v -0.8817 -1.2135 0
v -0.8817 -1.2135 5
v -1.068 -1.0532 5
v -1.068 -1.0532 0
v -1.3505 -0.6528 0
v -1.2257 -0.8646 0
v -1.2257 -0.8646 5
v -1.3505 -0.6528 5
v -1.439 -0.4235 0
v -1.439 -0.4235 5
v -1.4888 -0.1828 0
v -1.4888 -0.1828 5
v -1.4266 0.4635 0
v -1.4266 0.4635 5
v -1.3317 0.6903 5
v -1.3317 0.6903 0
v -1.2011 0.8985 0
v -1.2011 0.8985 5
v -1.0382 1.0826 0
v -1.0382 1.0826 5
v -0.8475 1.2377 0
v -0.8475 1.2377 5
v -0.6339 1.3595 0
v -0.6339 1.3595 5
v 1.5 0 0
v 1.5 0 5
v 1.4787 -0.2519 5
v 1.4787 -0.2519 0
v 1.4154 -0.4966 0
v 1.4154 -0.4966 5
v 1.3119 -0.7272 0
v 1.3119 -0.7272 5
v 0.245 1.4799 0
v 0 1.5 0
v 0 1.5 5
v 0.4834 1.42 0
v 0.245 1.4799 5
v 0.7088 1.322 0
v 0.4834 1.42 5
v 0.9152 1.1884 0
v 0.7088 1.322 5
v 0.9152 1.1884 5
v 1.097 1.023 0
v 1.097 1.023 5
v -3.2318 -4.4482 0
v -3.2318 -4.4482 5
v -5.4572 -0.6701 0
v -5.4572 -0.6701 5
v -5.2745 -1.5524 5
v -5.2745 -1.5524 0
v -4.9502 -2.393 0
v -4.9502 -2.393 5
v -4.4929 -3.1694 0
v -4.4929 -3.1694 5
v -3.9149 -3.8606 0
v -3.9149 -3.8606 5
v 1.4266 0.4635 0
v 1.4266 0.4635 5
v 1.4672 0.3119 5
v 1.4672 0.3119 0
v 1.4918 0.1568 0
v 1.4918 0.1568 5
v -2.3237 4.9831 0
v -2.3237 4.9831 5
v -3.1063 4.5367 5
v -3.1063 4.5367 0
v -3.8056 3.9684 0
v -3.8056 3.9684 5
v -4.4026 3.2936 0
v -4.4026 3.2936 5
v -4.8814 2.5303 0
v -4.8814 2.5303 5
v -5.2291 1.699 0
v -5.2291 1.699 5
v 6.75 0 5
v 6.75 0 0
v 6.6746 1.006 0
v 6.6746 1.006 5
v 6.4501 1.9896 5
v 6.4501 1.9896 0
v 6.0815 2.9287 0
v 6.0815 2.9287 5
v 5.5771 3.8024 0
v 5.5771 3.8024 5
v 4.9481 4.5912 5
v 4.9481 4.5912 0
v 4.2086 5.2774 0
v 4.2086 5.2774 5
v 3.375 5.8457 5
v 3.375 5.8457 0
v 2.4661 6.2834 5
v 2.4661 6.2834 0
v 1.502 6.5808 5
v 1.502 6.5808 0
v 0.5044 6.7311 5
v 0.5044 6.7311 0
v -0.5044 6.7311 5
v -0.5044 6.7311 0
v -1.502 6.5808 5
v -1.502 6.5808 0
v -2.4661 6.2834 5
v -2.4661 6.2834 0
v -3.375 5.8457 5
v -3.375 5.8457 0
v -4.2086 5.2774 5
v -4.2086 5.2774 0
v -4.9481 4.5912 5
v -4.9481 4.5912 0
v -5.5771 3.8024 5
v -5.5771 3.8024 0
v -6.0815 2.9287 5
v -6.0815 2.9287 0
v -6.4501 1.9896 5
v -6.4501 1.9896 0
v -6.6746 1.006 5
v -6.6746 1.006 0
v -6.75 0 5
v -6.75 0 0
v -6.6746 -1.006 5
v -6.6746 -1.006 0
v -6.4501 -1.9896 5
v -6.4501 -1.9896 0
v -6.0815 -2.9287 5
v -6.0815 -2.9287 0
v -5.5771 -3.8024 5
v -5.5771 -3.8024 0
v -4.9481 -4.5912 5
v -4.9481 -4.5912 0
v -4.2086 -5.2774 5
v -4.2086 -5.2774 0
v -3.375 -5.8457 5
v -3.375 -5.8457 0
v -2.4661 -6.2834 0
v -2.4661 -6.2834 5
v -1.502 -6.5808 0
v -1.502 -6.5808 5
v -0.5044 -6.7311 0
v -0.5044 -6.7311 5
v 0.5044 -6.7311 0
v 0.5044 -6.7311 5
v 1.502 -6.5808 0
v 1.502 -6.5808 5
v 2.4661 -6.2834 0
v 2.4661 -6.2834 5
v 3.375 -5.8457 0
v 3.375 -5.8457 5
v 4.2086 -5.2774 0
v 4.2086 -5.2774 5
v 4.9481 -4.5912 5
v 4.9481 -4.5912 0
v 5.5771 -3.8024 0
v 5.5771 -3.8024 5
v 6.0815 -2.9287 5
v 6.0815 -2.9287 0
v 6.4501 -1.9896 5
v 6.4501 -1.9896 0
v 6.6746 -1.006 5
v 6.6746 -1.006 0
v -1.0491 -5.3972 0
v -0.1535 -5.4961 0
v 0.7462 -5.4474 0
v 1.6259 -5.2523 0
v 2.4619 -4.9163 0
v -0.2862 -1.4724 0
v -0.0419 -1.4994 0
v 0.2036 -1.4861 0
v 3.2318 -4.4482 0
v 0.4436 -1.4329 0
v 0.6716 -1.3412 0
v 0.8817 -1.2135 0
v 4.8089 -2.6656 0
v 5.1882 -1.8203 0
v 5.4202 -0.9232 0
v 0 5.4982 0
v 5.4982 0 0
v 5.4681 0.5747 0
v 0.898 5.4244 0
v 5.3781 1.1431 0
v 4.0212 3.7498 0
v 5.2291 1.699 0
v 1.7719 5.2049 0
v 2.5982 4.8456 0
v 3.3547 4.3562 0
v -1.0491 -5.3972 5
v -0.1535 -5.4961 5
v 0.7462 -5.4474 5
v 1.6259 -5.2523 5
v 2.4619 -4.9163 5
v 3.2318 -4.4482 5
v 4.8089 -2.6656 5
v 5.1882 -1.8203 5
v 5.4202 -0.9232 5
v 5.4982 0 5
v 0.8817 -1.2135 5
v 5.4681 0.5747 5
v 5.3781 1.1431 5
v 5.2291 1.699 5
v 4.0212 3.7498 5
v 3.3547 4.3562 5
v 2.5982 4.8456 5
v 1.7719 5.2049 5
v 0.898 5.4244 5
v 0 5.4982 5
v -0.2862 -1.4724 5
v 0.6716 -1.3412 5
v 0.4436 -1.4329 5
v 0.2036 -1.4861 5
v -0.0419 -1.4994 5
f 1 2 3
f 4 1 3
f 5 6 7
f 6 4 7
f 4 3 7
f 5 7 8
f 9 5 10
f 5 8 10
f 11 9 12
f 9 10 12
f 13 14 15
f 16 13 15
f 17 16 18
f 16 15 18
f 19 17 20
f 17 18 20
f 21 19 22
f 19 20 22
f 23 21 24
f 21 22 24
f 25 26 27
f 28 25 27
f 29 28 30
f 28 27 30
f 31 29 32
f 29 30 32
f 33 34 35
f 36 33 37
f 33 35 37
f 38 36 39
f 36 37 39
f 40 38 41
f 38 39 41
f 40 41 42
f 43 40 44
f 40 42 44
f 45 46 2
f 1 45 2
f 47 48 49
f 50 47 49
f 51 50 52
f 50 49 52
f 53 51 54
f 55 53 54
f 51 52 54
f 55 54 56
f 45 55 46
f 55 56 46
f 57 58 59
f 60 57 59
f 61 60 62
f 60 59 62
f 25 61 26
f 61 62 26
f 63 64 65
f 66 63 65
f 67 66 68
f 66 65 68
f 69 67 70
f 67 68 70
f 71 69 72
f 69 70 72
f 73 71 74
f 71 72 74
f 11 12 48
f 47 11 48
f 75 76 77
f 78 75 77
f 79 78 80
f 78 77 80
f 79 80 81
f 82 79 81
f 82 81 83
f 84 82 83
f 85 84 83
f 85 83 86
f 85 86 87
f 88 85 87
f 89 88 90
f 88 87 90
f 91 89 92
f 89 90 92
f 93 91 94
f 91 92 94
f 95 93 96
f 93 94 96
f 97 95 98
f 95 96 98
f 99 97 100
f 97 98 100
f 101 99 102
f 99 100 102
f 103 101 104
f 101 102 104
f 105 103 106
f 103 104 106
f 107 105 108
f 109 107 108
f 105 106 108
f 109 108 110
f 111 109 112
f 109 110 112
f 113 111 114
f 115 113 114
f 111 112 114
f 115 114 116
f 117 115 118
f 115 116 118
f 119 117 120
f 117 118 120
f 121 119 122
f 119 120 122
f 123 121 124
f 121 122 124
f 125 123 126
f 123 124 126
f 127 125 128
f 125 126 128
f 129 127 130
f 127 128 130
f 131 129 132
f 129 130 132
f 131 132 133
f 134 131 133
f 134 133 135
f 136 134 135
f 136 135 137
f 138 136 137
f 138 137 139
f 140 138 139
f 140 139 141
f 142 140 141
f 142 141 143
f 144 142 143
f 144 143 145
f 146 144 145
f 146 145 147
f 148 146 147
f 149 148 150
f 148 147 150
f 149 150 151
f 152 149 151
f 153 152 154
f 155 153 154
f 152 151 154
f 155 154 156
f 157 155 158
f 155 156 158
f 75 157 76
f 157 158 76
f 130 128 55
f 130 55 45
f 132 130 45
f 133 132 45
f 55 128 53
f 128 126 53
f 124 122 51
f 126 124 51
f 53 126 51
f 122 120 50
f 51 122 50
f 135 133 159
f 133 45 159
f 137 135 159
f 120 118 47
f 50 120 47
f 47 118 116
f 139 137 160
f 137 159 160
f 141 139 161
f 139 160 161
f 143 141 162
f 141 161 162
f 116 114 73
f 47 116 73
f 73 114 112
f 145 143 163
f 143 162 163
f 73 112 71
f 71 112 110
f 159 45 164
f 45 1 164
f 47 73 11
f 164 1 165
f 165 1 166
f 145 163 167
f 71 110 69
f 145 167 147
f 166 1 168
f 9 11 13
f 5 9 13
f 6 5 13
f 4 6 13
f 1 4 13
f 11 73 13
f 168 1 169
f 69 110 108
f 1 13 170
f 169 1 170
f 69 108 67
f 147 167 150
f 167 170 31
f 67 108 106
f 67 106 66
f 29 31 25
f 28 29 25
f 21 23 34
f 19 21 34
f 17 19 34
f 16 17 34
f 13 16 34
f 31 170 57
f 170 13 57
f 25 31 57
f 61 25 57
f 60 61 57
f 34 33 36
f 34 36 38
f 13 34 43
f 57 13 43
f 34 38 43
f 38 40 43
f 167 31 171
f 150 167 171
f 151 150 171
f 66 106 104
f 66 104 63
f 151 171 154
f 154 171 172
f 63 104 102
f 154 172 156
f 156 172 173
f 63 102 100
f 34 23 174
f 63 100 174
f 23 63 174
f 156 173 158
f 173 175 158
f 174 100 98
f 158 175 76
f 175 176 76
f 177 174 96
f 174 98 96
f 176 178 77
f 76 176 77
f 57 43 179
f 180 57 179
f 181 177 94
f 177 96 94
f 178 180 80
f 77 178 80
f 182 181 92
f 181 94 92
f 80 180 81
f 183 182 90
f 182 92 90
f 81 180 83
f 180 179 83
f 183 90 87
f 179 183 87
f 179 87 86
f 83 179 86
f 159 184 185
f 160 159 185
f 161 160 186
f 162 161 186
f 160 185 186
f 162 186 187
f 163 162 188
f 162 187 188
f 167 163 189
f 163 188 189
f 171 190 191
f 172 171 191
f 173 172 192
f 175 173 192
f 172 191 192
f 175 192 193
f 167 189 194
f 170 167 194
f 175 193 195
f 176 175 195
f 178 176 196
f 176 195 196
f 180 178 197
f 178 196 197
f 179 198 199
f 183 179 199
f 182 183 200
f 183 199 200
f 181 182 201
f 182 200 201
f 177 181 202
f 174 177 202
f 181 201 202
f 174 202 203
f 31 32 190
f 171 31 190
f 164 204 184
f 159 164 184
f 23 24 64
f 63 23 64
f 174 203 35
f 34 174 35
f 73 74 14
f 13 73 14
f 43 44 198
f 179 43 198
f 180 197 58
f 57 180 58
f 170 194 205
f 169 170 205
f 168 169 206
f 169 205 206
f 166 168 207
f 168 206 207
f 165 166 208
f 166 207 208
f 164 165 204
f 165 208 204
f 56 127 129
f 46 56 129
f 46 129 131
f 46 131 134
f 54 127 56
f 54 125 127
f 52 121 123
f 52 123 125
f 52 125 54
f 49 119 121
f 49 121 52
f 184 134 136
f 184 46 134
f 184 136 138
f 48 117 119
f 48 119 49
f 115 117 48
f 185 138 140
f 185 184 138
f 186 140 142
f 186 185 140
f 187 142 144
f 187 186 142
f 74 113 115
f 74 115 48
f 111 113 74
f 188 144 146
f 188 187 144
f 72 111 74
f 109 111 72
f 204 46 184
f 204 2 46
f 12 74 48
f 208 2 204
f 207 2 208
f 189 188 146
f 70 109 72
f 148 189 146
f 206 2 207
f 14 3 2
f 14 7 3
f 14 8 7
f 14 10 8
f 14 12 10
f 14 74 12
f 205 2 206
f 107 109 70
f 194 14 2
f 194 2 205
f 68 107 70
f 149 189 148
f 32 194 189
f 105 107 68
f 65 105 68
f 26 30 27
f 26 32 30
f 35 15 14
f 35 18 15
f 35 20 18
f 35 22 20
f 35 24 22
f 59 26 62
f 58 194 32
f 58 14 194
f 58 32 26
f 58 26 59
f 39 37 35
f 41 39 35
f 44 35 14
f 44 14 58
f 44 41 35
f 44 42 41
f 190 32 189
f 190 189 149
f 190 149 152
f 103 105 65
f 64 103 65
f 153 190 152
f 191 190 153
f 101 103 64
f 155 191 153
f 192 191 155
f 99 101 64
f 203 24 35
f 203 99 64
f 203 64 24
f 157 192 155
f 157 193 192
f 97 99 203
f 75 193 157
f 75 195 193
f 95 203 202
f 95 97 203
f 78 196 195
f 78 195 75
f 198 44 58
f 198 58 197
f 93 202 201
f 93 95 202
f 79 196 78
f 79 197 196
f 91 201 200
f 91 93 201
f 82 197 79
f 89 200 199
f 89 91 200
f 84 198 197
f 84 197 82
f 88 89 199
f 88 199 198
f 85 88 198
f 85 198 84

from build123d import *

# Parameters (mm, degrees)
F0_R     = 6.75
F1_DEPTH = 5
F3_DEPTH = 25


# Not quite as in the source:
# - a feature names something its author has since deleted; it is built from what else it names


with BuildPart() as f1:
    # F0 (on Top) → F1 (new body)
    with BuildSketch(Plane.XY):
        Circle(F0_R)
    extrude(amount=F1_DEPTH)

    # F2 (on face) → F3 (cut)
    with BuildSketch(Plane.XY.offset(5)):
        with BuildLine():
            Line((1.0970305524, 1.0229975401), (4.02115299, 3.7497858268))
            ThreePointArc((4.02115299, 3.7497858268), (2.192415253, 5.04220988), (0, 5.4982329084))
            Line((0, 5.4982329084), (0, 1.5))
            ThreePointArc((0, 1.5), (0.5981236034, 1.3755901116), (1.0970305524, 1.0229975401))
        make_face()
        with BuildLine():
            Line((-0.6339273926, 1.3594616806), (-2.3236536344, 4.9830912999))
            ThreePointArc((-2.3236536344, 4.9830912999), (-4.117932991, 3.6432393549), (-5.2291302357, 1.6990474077))
            Line((-5.2291302357, 1.6990474077), (-1.4265847744, 0.4635254916))
            ThreePointArc((-1.4265847744, 0.4635254916), (-1.1234335812, 0.9939300723), (-0.6339273926, 1.3594616806))
        make_face()
        with BuildLine():
            ThreePointArc((-5.4572499141, -0.6700660344), (-4.7374378048, -2.7905641295), (-3.2317802172, -4.448163862))
            Line((-3.2317802172, -4.448163862), (-0.8816778784, -1.2135254916))
            ThreePointArc((-0.8816778784, -1.2135254916), (-1.2924437407, -0.7613075444), (-1.4888192275, -0.1828040151))
            Line((-1.4888192275, -0.1828040151), (-5.4572499141, -0.6700660344))
        make_face()
        with BuildLine():
            ThreePointArc((-1.0491122976, -5.3972148839), (1.190035408, -5.3679028347), (3.2317802172, -4.448163862))
            Line((3.2317802172, -4.448163862), (0.8816778784, -1.2135254916))
            ThreePointArc((0.8816778784, -1.2135254916), (0.3246594209, -1.4644440107), (-0.2862134931, -1.4724407752))
            Line((-0.2862134931, -1.4724407752), (-1.0491122976, -5.3972148839))
        make_face()
        with BuildLine():
            ThreePointArc((4.8088628562, -2.6655962084), (5.3231012166, -1.3766475779), (5.4982329084, 0))
            ThreePointArc((5.4982329084, 0), (5.4305405375, 0.8601131237), (5.2291302357, 1.6990474077))
            Line((5.2291302357, 1.6990474077), (1.4265847744, 0.4635254916))
            ThreePointArc((1.4265847744, 0.4635254916), (1.4815325109, 0.2346516976), (1.5, 0))
            ThreePointArc((1.5, 0), (1.4522214606, -0.3755700061), (1.3119295607, -0.7272144304))
            Line((1.3119295607, -0.7272144304), (4.8088628562, -2.6655962084))
        make_face()
    extrude(amount=-F3_DEPTH, mode=Mode.SUBTRACT)


solid = f1.part
